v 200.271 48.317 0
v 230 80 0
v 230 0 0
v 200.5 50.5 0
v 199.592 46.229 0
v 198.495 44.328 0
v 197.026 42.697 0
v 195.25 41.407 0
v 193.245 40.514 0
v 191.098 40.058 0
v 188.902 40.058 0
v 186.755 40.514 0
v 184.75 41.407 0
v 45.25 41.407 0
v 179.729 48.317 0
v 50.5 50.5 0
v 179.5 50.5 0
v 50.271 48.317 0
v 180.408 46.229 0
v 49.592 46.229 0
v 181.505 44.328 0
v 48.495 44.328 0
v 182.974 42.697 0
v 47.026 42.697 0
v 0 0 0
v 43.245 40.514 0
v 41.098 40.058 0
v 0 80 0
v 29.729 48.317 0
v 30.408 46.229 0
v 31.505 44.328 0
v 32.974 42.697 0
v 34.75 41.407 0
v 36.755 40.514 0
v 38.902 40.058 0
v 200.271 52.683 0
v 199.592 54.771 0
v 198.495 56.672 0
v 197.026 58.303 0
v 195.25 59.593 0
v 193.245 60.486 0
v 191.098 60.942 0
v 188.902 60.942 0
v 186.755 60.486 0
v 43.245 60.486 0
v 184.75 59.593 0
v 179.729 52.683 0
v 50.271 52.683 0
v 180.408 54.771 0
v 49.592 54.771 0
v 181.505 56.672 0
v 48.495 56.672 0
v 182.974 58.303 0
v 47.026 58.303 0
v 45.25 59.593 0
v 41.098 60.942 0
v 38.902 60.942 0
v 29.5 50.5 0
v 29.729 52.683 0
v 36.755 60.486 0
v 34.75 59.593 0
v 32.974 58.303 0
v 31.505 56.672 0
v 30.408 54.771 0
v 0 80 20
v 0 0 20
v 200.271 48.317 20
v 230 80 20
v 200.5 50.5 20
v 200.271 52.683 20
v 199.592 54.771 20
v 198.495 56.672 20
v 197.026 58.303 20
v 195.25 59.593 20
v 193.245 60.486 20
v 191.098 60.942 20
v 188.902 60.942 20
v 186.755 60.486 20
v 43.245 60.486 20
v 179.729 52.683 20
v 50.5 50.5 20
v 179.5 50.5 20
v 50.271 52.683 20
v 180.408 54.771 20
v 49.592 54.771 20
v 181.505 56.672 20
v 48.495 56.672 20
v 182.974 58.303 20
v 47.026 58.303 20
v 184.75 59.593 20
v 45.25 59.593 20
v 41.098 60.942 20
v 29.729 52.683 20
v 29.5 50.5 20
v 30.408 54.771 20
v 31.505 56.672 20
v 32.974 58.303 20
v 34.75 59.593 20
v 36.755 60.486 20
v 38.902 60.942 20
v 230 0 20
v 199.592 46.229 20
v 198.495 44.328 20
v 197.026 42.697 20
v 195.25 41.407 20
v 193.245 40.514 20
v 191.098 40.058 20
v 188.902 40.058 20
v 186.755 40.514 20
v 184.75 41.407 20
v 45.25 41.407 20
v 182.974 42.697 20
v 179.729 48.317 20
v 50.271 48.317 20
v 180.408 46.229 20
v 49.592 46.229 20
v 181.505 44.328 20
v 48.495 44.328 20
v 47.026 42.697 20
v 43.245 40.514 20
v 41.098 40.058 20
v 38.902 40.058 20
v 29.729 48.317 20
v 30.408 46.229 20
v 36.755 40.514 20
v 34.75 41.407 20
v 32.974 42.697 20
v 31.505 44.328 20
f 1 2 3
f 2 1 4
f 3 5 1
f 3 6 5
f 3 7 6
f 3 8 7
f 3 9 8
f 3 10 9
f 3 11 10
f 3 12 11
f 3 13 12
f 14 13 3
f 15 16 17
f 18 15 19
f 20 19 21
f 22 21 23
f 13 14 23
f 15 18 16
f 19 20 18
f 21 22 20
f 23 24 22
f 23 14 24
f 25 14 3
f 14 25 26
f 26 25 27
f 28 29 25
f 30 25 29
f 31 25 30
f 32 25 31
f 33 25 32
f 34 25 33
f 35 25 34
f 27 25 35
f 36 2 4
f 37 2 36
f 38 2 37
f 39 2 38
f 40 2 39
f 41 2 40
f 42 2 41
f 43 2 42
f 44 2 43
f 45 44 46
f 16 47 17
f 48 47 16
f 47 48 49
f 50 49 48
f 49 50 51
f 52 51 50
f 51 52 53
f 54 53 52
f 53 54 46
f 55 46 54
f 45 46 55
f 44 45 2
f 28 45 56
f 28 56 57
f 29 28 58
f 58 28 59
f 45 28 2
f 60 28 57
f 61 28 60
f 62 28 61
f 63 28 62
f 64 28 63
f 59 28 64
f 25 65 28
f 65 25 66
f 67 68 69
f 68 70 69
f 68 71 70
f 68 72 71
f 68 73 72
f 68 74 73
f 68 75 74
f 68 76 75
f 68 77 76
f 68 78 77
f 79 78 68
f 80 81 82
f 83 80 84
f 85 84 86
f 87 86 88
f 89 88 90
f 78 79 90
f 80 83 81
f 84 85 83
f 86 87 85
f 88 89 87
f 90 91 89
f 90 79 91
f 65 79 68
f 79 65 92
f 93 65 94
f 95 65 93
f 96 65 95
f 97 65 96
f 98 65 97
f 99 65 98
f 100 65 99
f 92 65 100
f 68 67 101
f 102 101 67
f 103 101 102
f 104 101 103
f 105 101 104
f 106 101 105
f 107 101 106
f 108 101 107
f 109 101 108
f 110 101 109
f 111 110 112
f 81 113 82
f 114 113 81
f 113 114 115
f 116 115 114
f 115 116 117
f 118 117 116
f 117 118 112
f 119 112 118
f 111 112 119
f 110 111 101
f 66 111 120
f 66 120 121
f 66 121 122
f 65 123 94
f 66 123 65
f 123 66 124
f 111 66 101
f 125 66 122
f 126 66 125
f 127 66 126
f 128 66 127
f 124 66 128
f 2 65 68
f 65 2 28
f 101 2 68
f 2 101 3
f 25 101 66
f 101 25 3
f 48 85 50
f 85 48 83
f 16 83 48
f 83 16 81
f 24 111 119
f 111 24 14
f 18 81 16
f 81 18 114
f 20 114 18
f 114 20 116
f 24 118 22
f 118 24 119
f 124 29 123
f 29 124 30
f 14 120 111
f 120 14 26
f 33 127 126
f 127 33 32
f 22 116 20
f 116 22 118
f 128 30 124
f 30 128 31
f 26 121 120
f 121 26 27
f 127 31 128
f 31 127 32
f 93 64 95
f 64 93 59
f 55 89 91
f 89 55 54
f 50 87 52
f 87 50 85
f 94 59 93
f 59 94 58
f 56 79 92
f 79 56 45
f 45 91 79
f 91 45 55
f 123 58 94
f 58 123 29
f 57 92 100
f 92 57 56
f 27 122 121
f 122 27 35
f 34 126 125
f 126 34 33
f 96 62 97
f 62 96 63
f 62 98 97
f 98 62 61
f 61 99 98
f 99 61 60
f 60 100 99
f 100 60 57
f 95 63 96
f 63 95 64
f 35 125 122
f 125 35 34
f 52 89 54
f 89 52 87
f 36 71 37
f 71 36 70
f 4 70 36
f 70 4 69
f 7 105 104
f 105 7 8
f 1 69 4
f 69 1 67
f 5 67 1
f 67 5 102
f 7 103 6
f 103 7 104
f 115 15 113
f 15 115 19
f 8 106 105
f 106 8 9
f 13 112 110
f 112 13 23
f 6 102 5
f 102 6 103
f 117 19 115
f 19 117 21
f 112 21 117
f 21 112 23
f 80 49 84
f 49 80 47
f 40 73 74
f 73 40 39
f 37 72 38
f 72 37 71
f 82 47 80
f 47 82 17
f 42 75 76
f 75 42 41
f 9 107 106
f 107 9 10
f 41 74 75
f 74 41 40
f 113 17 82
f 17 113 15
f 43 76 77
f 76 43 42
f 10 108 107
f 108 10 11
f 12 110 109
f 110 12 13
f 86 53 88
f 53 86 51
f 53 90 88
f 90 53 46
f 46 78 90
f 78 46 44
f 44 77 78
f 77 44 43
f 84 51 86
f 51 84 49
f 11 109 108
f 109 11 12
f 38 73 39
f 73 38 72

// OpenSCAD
distance_between_spines = 150;
height_spines = 40;
spine_diameter = 21;
spine_radius = spine_diameter / 2;
margin = 40;
stand_thickness = 20;

model();

module model() {
    difference() {
        stand();
        spine_front();
        spine_back();
    }
}

module stand() {
    translate([0, 0]) {
        linear_extrude(stand_thickness) {
            width = margin * 2 + distance_between_spines;
            height = height_spines + margin;
            square([width, height]);
        }
    }
}

module spine_front() {
    translate([margin, height_spines + spine_radius]) {
        spine();
    }
}

module spine_back() {
    translate([margin + distance_between_spines, height_spines + spine_radius]) {
        spine();
    }
}

module spine() {
    linear_extrude(stand_thickness) {
        circle(d=spine_diameter);
    }
}
